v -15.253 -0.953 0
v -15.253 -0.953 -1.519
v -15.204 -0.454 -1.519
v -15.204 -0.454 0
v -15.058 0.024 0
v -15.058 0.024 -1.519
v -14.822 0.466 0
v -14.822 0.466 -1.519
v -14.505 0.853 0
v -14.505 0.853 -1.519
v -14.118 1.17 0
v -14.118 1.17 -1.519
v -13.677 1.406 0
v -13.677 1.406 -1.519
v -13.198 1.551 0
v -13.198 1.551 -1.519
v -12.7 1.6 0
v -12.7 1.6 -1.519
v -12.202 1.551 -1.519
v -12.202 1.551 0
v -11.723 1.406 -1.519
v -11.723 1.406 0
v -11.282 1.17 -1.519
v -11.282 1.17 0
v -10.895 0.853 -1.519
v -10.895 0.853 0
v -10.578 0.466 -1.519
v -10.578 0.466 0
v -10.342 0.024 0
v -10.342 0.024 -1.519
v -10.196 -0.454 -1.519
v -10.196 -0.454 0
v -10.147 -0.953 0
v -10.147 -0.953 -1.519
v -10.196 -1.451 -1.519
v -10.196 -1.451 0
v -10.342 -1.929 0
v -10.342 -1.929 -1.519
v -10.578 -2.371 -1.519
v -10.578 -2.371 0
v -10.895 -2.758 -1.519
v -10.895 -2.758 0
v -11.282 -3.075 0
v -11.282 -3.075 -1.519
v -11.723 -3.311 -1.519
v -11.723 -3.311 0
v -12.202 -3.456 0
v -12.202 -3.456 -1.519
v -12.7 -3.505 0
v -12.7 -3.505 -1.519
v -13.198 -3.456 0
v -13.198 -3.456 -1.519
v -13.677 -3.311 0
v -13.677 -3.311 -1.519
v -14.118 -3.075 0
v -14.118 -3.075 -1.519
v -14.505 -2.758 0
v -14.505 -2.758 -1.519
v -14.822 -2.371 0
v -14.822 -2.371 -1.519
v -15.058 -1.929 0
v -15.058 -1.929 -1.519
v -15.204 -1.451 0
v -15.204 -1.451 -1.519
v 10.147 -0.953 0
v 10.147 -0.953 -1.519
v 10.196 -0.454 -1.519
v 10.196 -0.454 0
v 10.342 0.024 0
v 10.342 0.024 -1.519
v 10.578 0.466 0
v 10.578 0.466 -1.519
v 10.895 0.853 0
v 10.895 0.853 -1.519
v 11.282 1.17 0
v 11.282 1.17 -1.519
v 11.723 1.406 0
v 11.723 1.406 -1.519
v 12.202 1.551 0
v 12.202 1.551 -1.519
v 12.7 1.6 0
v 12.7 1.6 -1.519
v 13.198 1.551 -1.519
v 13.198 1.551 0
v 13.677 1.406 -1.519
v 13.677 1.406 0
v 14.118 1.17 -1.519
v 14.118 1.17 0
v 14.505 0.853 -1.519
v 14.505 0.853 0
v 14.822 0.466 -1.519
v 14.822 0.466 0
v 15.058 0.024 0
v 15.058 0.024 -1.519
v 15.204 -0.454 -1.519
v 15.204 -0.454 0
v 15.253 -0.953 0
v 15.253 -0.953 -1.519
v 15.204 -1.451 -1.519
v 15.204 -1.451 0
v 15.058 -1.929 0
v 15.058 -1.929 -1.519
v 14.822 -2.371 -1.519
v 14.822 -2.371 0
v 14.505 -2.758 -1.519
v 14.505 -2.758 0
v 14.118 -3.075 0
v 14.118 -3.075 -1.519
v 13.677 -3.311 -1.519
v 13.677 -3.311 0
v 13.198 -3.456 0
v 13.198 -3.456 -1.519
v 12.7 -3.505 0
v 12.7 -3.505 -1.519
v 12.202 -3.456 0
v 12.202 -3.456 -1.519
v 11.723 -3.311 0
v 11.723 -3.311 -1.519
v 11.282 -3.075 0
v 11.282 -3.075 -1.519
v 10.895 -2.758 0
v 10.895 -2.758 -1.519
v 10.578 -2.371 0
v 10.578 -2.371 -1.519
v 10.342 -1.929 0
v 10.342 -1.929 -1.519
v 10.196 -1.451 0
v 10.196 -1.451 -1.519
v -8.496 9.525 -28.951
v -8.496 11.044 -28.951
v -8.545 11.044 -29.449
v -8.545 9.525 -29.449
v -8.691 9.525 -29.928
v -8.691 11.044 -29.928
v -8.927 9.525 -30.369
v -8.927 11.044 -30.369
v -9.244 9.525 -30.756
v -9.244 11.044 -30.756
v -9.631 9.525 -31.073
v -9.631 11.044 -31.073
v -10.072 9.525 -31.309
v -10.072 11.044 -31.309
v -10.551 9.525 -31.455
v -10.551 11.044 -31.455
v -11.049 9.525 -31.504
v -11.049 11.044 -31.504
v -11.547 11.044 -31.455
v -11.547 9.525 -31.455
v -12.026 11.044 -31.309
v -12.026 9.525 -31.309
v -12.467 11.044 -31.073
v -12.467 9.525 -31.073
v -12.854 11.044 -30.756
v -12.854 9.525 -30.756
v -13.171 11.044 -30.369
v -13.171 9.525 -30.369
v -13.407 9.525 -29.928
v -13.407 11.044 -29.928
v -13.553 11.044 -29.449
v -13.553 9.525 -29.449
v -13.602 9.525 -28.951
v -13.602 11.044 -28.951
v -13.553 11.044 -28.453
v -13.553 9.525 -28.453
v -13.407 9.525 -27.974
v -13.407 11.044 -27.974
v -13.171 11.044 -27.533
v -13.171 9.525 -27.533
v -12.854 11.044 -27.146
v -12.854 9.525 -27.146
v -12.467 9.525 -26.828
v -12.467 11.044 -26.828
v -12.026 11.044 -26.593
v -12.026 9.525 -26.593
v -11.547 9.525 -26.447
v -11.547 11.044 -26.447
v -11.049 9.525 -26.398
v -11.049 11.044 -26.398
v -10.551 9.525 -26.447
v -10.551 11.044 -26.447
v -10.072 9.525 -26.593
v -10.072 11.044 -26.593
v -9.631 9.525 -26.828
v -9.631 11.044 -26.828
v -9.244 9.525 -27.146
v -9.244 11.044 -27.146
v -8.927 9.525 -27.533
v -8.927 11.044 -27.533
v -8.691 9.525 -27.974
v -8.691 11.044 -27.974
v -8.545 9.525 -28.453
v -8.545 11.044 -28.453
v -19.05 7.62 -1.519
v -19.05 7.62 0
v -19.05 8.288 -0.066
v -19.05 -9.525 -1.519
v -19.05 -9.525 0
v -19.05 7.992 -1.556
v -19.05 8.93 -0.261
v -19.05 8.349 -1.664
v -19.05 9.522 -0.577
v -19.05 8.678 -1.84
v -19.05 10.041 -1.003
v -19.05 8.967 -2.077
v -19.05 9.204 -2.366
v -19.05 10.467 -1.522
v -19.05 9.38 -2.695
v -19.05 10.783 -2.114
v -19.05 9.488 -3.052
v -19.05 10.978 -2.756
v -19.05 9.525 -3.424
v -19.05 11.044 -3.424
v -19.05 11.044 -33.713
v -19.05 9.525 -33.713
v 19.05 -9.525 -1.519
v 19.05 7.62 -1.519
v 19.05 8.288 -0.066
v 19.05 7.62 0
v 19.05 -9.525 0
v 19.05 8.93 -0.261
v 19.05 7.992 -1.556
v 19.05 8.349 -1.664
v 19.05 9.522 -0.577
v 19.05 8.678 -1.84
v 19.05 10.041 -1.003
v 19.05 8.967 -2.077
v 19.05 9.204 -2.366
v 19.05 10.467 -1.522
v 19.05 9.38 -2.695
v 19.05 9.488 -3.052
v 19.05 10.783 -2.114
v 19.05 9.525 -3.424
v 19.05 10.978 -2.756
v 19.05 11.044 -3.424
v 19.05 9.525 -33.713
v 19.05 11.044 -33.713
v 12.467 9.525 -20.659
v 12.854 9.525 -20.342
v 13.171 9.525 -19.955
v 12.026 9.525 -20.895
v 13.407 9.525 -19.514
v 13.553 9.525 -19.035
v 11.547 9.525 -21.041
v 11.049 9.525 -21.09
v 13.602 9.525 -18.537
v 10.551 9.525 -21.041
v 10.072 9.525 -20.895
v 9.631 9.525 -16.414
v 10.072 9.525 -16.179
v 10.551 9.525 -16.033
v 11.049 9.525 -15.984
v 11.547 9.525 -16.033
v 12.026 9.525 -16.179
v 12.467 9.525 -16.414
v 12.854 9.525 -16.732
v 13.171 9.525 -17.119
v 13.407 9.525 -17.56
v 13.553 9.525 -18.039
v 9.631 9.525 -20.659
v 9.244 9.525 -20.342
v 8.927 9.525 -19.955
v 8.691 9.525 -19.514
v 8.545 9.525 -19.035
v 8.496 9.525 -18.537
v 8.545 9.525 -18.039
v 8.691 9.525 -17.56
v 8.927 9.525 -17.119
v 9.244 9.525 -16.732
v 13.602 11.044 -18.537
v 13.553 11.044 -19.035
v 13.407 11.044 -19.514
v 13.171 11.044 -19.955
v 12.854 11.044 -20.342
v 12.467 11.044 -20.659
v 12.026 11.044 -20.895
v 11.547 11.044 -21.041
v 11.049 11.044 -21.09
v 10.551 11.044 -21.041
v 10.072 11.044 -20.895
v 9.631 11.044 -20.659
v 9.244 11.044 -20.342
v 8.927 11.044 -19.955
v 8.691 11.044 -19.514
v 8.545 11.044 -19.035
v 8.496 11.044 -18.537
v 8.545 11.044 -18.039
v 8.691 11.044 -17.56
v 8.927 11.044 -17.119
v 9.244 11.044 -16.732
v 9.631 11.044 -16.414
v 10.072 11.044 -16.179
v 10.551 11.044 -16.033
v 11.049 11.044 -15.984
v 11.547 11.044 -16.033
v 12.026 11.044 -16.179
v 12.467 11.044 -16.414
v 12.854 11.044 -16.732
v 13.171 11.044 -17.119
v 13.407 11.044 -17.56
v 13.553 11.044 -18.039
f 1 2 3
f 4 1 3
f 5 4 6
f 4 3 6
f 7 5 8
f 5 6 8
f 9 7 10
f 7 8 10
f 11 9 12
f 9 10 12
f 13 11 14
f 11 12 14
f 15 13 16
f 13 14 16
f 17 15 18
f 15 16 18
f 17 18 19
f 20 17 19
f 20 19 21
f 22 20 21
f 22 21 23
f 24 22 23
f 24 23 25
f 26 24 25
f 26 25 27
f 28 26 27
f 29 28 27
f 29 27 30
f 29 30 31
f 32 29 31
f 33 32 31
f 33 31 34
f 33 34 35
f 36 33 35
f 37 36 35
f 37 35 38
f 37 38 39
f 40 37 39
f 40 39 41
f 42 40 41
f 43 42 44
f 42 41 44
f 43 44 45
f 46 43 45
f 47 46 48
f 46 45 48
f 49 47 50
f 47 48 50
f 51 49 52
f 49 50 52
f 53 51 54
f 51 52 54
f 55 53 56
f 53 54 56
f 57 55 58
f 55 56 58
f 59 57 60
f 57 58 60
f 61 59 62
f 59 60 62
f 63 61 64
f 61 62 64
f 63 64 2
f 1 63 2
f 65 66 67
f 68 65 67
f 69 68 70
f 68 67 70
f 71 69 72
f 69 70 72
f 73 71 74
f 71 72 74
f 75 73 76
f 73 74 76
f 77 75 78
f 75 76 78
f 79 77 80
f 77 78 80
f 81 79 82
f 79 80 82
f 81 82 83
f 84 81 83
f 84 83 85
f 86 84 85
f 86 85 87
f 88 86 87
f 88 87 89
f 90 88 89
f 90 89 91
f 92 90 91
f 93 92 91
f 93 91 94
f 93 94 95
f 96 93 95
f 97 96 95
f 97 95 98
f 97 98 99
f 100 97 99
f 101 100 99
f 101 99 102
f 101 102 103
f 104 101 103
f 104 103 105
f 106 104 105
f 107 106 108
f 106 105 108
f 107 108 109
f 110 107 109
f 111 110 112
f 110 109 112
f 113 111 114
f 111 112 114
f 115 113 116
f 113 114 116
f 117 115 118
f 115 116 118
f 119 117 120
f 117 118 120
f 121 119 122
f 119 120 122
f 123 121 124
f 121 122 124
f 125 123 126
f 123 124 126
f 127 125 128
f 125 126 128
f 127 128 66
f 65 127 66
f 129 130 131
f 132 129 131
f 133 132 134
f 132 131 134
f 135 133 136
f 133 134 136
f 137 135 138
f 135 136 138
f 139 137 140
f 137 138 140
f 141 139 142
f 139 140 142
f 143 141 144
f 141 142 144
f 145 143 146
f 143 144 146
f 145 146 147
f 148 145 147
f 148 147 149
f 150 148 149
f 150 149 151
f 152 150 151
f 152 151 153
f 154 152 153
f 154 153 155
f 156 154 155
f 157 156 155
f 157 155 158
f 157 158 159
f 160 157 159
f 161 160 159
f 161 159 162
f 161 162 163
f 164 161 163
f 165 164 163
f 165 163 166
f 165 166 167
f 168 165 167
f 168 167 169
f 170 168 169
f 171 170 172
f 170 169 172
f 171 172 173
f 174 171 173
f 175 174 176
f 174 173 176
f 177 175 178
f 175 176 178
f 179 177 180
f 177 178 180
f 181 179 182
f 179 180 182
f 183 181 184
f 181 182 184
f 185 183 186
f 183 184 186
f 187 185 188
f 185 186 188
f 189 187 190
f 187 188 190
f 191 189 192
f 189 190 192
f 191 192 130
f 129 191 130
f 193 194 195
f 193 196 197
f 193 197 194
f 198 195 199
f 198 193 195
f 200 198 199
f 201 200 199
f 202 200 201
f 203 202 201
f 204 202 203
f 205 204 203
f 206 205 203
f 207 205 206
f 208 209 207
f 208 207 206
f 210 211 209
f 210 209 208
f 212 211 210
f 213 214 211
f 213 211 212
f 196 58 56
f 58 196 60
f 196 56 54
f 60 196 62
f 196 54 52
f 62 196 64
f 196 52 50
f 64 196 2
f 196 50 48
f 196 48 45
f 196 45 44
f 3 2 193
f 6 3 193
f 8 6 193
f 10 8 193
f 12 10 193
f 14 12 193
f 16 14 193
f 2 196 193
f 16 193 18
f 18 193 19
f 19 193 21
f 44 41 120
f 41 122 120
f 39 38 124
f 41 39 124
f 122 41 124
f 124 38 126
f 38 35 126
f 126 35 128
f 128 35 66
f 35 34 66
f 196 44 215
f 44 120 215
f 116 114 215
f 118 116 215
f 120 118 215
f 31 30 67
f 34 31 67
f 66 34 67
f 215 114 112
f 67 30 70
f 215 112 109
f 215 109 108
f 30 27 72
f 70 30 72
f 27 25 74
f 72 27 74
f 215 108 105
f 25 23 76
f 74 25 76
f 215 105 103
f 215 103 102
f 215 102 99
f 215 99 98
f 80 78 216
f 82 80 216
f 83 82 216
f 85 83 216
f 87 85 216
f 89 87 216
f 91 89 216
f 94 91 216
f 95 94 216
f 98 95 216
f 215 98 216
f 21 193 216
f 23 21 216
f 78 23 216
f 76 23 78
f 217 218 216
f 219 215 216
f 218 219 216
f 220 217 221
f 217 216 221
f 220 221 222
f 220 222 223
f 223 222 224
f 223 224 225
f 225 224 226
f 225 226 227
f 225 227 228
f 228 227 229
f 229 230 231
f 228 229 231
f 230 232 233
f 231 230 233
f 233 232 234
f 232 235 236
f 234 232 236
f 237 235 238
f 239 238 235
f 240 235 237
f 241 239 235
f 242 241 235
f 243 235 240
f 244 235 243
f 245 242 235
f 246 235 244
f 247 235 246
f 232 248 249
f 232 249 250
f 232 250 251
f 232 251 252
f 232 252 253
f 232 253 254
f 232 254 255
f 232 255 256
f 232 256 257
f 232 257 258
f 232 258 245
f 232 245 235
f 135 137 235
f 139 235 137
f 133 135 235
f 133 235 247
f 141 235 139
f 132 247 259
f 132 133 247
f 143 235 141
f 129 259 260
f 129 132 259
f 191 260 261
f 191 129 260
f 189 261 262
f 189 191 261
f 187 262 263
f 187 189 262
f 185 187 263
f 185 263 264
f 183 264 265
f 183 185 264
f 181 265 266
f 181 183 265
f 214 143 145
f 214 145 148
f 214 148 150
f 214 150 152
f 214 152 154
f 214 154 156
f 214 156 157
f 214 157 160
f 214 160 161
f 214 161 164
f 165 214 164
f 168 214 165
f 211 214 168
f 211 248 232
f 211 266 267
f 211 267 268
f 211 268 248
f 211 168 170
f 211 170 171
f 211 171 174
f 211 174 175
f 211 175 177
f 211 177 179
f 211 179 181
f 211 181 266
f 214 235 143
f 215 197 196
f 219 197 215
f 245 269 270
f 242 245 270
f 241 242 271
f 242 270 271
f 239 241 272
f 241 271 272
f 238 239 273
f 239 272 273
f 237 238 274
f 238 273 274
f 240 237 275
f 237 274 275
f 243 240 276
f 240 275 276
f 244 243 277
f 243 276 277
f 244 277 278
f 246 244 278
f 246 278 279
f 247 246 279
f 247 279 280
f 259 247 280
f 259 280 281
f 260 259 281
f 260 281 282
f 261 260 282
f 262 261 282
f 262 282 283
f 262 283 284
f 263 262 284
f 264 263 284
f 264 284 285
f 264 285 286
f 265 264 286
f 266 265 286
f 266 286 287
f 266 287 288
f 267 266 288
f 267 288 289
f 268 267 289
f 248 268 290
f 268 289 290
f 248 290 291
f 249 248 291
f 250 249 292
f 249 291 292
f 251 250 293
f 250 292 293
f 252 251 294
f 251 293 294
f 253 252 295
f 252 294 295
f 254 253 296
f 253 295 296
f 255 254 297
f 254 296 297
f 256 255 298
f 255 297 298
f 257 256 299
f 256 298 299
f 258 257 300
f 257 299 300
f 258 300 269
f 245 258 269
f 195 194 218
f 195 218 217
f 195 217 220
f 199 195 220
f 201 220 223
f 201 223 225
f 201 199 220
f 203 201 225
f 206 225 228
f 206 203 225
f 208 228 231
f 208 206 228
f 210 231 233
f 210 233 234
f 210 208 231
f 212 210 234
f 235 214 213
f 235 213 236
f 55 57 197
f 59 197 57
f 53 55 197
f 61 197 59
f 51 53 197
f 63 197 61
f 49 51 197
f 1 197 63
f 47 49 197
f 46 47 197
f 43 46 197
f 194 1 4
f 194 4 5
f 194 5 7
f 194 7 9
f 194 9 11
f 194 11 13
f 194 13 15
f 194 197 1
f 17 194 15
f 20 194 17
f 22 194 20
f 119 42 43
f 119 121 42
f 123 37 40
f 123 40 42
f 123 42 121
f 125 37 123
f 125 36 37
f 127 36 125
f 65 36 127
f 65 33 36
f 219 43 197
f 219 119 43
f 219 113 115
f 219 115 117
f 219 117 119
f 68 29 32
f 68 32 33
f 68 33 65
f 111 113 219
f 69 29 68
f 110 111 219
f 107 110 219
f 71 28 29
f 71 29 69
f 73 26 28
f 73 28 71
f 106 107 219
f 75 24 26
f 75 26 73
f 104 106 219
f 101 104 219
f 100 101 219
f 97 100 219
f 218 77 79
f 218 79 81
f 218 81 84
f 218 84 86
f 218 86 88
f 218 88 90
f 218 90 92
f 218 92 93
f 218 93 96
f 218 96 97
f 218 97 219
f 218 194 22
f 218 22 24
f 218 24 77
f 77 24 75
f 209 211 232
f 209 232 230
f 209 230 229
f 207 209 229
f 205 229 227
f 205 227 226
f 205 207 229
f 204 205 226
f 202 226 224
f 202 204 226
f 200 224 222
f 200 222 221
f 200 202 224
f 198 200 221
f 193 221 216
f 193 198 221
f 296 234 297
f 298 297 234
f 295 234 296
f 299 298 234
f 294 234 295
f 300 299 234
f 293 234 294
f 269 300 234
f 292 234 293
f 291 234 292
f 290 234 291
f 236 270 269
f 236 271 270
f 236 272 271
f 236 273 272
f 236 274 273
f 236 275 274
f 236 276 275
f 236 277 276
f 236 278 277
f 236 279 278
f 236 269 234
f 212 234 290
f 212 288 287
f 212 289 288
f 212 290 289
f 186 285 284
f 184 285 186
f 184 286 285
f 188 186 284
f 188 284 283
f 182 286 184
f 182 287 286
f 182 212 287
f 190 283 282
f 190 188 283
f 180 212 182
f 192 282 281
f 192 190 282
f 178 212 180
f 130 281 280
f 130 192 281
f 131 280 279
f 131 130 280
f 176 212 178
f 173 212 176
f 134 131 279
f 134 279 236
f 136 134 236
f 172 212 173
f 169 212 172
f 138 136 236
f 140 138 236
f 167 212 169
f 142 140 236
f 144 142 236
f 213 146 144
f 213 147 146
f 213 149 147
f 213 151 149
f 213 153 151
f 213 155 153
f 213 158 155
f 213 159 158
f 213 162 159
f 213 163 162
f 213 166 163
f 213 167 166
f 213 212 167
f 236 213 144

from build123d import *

# Parameters (mm, degrees)
SKETCH7_W                    = 38.1
SKETCH7_H                    = 19.05
BASE_FLANGE1_DEPTH           = 1.51892
EDGE_FLANGE1_STRIP_W         = 9.88568
EDGE_FLANGE1_STRIP_H         = 1.51892
EDGE_FLANGE1_STRIP_CUT_DEPTH = 38.1
EDGE_FLANGE1_DEPTH           = 38.1
F_10_CLEARANCE_HOLE1_D       = 5.1054
F_10_CLEARANCE_HOLE2_D       = 5.1054
SKETCH24_W                   = 38.1
SKETCH24_H                   = 12.2555
CUT_EXTRUDE1_DEPTH           = 54.281766168


# Sheet-metal steps are written as plain solids
with BuildPart() as part:
    # Sketch7 → Base-Flange1 (new body)
    with BuildSketch(Plane.XY):
        Rectangle(SKETCH7_W, SKETCH7_H)
    extrude(amount=-BASE_FLANGE1_DEPTH)

    # Edge-Flange1 strip (across the edge) → Edge-Flange1 strip cut (cut)
    with BuildSketch(Plane(origin=(-19.05, 9.525, -1.51892), x_dir=(0, -1, 0), z_dir=(1, 0, 0))):
        with Locations((-3.03784, -0.75946)):
            Rectangle(EDGE_FLANGE1_STRIP_W, EDGE_FLANGE1_STRIP_H)
    extrude(amount=EDGE_FLANGE1_STRIP_CUT_DEPTH, mode=Mode.SUBTRACT)

    # Edge-Flange1 section (across the edge) → Edge-Flange1 (add)
    with BuildSketch(Plane(origin=(-19.05, 9.525, -1.51892), x_dir=(0, -1, 0), z_dir=(1, 0, 0))):
        with BuildLine():
            Line((-1.51892, 1.905), (-1.51892, 44.45))
            Line((-1.51892, 44.45), (0, 44.45))
            Line((0, 44.45), (0, 1.905))
            ThreePointArc((0, 1.905), (0.557961582, 0.557961582), (1.905, 0))
            Line((1.905, 0), (1.905, -1.51892))
            ThreePointArc((1.905, -1.51892), (-0.51607705, -0.51607705), (-1.51892, 1.905))
        make_face()
    extrude(amount=EDGE_FLANGE1_DEPTH)

    # #10 Clearance Hole1 (through all)
    with Locations(Plane.XY):
        with Locations((-12.7, -0.9525), (12.7, -0.9525)):
            Hole(F_10_CLEARANCE_HOLE1_D / 2)

    # #10 Clearance Hole2 (through all)
    with Locations(Plane(origin=(0, 9.525, 0), x_dir=(-1, 0, 0), z_dir=(0, -1, 0))):
        with Locations((-11.049, 18.53692), (11.049, 28.95092)):
            Hole(F_10_CLEARANCE_HOLE2_D / 2)

    # Sketch24 → Cut-Extrude1 (cut, through all)
    with BuildSketch(Plane.XZ.offset(-9.525)):
        with Locations((0, -39.84117)):
            Rectangle(SKETCH24_W, SKETCH24_H)
    extrude(amount=-CUT_EXTRUDE1_DEPTH, mode=Mode.SUBTRACT)


solid = part.part
